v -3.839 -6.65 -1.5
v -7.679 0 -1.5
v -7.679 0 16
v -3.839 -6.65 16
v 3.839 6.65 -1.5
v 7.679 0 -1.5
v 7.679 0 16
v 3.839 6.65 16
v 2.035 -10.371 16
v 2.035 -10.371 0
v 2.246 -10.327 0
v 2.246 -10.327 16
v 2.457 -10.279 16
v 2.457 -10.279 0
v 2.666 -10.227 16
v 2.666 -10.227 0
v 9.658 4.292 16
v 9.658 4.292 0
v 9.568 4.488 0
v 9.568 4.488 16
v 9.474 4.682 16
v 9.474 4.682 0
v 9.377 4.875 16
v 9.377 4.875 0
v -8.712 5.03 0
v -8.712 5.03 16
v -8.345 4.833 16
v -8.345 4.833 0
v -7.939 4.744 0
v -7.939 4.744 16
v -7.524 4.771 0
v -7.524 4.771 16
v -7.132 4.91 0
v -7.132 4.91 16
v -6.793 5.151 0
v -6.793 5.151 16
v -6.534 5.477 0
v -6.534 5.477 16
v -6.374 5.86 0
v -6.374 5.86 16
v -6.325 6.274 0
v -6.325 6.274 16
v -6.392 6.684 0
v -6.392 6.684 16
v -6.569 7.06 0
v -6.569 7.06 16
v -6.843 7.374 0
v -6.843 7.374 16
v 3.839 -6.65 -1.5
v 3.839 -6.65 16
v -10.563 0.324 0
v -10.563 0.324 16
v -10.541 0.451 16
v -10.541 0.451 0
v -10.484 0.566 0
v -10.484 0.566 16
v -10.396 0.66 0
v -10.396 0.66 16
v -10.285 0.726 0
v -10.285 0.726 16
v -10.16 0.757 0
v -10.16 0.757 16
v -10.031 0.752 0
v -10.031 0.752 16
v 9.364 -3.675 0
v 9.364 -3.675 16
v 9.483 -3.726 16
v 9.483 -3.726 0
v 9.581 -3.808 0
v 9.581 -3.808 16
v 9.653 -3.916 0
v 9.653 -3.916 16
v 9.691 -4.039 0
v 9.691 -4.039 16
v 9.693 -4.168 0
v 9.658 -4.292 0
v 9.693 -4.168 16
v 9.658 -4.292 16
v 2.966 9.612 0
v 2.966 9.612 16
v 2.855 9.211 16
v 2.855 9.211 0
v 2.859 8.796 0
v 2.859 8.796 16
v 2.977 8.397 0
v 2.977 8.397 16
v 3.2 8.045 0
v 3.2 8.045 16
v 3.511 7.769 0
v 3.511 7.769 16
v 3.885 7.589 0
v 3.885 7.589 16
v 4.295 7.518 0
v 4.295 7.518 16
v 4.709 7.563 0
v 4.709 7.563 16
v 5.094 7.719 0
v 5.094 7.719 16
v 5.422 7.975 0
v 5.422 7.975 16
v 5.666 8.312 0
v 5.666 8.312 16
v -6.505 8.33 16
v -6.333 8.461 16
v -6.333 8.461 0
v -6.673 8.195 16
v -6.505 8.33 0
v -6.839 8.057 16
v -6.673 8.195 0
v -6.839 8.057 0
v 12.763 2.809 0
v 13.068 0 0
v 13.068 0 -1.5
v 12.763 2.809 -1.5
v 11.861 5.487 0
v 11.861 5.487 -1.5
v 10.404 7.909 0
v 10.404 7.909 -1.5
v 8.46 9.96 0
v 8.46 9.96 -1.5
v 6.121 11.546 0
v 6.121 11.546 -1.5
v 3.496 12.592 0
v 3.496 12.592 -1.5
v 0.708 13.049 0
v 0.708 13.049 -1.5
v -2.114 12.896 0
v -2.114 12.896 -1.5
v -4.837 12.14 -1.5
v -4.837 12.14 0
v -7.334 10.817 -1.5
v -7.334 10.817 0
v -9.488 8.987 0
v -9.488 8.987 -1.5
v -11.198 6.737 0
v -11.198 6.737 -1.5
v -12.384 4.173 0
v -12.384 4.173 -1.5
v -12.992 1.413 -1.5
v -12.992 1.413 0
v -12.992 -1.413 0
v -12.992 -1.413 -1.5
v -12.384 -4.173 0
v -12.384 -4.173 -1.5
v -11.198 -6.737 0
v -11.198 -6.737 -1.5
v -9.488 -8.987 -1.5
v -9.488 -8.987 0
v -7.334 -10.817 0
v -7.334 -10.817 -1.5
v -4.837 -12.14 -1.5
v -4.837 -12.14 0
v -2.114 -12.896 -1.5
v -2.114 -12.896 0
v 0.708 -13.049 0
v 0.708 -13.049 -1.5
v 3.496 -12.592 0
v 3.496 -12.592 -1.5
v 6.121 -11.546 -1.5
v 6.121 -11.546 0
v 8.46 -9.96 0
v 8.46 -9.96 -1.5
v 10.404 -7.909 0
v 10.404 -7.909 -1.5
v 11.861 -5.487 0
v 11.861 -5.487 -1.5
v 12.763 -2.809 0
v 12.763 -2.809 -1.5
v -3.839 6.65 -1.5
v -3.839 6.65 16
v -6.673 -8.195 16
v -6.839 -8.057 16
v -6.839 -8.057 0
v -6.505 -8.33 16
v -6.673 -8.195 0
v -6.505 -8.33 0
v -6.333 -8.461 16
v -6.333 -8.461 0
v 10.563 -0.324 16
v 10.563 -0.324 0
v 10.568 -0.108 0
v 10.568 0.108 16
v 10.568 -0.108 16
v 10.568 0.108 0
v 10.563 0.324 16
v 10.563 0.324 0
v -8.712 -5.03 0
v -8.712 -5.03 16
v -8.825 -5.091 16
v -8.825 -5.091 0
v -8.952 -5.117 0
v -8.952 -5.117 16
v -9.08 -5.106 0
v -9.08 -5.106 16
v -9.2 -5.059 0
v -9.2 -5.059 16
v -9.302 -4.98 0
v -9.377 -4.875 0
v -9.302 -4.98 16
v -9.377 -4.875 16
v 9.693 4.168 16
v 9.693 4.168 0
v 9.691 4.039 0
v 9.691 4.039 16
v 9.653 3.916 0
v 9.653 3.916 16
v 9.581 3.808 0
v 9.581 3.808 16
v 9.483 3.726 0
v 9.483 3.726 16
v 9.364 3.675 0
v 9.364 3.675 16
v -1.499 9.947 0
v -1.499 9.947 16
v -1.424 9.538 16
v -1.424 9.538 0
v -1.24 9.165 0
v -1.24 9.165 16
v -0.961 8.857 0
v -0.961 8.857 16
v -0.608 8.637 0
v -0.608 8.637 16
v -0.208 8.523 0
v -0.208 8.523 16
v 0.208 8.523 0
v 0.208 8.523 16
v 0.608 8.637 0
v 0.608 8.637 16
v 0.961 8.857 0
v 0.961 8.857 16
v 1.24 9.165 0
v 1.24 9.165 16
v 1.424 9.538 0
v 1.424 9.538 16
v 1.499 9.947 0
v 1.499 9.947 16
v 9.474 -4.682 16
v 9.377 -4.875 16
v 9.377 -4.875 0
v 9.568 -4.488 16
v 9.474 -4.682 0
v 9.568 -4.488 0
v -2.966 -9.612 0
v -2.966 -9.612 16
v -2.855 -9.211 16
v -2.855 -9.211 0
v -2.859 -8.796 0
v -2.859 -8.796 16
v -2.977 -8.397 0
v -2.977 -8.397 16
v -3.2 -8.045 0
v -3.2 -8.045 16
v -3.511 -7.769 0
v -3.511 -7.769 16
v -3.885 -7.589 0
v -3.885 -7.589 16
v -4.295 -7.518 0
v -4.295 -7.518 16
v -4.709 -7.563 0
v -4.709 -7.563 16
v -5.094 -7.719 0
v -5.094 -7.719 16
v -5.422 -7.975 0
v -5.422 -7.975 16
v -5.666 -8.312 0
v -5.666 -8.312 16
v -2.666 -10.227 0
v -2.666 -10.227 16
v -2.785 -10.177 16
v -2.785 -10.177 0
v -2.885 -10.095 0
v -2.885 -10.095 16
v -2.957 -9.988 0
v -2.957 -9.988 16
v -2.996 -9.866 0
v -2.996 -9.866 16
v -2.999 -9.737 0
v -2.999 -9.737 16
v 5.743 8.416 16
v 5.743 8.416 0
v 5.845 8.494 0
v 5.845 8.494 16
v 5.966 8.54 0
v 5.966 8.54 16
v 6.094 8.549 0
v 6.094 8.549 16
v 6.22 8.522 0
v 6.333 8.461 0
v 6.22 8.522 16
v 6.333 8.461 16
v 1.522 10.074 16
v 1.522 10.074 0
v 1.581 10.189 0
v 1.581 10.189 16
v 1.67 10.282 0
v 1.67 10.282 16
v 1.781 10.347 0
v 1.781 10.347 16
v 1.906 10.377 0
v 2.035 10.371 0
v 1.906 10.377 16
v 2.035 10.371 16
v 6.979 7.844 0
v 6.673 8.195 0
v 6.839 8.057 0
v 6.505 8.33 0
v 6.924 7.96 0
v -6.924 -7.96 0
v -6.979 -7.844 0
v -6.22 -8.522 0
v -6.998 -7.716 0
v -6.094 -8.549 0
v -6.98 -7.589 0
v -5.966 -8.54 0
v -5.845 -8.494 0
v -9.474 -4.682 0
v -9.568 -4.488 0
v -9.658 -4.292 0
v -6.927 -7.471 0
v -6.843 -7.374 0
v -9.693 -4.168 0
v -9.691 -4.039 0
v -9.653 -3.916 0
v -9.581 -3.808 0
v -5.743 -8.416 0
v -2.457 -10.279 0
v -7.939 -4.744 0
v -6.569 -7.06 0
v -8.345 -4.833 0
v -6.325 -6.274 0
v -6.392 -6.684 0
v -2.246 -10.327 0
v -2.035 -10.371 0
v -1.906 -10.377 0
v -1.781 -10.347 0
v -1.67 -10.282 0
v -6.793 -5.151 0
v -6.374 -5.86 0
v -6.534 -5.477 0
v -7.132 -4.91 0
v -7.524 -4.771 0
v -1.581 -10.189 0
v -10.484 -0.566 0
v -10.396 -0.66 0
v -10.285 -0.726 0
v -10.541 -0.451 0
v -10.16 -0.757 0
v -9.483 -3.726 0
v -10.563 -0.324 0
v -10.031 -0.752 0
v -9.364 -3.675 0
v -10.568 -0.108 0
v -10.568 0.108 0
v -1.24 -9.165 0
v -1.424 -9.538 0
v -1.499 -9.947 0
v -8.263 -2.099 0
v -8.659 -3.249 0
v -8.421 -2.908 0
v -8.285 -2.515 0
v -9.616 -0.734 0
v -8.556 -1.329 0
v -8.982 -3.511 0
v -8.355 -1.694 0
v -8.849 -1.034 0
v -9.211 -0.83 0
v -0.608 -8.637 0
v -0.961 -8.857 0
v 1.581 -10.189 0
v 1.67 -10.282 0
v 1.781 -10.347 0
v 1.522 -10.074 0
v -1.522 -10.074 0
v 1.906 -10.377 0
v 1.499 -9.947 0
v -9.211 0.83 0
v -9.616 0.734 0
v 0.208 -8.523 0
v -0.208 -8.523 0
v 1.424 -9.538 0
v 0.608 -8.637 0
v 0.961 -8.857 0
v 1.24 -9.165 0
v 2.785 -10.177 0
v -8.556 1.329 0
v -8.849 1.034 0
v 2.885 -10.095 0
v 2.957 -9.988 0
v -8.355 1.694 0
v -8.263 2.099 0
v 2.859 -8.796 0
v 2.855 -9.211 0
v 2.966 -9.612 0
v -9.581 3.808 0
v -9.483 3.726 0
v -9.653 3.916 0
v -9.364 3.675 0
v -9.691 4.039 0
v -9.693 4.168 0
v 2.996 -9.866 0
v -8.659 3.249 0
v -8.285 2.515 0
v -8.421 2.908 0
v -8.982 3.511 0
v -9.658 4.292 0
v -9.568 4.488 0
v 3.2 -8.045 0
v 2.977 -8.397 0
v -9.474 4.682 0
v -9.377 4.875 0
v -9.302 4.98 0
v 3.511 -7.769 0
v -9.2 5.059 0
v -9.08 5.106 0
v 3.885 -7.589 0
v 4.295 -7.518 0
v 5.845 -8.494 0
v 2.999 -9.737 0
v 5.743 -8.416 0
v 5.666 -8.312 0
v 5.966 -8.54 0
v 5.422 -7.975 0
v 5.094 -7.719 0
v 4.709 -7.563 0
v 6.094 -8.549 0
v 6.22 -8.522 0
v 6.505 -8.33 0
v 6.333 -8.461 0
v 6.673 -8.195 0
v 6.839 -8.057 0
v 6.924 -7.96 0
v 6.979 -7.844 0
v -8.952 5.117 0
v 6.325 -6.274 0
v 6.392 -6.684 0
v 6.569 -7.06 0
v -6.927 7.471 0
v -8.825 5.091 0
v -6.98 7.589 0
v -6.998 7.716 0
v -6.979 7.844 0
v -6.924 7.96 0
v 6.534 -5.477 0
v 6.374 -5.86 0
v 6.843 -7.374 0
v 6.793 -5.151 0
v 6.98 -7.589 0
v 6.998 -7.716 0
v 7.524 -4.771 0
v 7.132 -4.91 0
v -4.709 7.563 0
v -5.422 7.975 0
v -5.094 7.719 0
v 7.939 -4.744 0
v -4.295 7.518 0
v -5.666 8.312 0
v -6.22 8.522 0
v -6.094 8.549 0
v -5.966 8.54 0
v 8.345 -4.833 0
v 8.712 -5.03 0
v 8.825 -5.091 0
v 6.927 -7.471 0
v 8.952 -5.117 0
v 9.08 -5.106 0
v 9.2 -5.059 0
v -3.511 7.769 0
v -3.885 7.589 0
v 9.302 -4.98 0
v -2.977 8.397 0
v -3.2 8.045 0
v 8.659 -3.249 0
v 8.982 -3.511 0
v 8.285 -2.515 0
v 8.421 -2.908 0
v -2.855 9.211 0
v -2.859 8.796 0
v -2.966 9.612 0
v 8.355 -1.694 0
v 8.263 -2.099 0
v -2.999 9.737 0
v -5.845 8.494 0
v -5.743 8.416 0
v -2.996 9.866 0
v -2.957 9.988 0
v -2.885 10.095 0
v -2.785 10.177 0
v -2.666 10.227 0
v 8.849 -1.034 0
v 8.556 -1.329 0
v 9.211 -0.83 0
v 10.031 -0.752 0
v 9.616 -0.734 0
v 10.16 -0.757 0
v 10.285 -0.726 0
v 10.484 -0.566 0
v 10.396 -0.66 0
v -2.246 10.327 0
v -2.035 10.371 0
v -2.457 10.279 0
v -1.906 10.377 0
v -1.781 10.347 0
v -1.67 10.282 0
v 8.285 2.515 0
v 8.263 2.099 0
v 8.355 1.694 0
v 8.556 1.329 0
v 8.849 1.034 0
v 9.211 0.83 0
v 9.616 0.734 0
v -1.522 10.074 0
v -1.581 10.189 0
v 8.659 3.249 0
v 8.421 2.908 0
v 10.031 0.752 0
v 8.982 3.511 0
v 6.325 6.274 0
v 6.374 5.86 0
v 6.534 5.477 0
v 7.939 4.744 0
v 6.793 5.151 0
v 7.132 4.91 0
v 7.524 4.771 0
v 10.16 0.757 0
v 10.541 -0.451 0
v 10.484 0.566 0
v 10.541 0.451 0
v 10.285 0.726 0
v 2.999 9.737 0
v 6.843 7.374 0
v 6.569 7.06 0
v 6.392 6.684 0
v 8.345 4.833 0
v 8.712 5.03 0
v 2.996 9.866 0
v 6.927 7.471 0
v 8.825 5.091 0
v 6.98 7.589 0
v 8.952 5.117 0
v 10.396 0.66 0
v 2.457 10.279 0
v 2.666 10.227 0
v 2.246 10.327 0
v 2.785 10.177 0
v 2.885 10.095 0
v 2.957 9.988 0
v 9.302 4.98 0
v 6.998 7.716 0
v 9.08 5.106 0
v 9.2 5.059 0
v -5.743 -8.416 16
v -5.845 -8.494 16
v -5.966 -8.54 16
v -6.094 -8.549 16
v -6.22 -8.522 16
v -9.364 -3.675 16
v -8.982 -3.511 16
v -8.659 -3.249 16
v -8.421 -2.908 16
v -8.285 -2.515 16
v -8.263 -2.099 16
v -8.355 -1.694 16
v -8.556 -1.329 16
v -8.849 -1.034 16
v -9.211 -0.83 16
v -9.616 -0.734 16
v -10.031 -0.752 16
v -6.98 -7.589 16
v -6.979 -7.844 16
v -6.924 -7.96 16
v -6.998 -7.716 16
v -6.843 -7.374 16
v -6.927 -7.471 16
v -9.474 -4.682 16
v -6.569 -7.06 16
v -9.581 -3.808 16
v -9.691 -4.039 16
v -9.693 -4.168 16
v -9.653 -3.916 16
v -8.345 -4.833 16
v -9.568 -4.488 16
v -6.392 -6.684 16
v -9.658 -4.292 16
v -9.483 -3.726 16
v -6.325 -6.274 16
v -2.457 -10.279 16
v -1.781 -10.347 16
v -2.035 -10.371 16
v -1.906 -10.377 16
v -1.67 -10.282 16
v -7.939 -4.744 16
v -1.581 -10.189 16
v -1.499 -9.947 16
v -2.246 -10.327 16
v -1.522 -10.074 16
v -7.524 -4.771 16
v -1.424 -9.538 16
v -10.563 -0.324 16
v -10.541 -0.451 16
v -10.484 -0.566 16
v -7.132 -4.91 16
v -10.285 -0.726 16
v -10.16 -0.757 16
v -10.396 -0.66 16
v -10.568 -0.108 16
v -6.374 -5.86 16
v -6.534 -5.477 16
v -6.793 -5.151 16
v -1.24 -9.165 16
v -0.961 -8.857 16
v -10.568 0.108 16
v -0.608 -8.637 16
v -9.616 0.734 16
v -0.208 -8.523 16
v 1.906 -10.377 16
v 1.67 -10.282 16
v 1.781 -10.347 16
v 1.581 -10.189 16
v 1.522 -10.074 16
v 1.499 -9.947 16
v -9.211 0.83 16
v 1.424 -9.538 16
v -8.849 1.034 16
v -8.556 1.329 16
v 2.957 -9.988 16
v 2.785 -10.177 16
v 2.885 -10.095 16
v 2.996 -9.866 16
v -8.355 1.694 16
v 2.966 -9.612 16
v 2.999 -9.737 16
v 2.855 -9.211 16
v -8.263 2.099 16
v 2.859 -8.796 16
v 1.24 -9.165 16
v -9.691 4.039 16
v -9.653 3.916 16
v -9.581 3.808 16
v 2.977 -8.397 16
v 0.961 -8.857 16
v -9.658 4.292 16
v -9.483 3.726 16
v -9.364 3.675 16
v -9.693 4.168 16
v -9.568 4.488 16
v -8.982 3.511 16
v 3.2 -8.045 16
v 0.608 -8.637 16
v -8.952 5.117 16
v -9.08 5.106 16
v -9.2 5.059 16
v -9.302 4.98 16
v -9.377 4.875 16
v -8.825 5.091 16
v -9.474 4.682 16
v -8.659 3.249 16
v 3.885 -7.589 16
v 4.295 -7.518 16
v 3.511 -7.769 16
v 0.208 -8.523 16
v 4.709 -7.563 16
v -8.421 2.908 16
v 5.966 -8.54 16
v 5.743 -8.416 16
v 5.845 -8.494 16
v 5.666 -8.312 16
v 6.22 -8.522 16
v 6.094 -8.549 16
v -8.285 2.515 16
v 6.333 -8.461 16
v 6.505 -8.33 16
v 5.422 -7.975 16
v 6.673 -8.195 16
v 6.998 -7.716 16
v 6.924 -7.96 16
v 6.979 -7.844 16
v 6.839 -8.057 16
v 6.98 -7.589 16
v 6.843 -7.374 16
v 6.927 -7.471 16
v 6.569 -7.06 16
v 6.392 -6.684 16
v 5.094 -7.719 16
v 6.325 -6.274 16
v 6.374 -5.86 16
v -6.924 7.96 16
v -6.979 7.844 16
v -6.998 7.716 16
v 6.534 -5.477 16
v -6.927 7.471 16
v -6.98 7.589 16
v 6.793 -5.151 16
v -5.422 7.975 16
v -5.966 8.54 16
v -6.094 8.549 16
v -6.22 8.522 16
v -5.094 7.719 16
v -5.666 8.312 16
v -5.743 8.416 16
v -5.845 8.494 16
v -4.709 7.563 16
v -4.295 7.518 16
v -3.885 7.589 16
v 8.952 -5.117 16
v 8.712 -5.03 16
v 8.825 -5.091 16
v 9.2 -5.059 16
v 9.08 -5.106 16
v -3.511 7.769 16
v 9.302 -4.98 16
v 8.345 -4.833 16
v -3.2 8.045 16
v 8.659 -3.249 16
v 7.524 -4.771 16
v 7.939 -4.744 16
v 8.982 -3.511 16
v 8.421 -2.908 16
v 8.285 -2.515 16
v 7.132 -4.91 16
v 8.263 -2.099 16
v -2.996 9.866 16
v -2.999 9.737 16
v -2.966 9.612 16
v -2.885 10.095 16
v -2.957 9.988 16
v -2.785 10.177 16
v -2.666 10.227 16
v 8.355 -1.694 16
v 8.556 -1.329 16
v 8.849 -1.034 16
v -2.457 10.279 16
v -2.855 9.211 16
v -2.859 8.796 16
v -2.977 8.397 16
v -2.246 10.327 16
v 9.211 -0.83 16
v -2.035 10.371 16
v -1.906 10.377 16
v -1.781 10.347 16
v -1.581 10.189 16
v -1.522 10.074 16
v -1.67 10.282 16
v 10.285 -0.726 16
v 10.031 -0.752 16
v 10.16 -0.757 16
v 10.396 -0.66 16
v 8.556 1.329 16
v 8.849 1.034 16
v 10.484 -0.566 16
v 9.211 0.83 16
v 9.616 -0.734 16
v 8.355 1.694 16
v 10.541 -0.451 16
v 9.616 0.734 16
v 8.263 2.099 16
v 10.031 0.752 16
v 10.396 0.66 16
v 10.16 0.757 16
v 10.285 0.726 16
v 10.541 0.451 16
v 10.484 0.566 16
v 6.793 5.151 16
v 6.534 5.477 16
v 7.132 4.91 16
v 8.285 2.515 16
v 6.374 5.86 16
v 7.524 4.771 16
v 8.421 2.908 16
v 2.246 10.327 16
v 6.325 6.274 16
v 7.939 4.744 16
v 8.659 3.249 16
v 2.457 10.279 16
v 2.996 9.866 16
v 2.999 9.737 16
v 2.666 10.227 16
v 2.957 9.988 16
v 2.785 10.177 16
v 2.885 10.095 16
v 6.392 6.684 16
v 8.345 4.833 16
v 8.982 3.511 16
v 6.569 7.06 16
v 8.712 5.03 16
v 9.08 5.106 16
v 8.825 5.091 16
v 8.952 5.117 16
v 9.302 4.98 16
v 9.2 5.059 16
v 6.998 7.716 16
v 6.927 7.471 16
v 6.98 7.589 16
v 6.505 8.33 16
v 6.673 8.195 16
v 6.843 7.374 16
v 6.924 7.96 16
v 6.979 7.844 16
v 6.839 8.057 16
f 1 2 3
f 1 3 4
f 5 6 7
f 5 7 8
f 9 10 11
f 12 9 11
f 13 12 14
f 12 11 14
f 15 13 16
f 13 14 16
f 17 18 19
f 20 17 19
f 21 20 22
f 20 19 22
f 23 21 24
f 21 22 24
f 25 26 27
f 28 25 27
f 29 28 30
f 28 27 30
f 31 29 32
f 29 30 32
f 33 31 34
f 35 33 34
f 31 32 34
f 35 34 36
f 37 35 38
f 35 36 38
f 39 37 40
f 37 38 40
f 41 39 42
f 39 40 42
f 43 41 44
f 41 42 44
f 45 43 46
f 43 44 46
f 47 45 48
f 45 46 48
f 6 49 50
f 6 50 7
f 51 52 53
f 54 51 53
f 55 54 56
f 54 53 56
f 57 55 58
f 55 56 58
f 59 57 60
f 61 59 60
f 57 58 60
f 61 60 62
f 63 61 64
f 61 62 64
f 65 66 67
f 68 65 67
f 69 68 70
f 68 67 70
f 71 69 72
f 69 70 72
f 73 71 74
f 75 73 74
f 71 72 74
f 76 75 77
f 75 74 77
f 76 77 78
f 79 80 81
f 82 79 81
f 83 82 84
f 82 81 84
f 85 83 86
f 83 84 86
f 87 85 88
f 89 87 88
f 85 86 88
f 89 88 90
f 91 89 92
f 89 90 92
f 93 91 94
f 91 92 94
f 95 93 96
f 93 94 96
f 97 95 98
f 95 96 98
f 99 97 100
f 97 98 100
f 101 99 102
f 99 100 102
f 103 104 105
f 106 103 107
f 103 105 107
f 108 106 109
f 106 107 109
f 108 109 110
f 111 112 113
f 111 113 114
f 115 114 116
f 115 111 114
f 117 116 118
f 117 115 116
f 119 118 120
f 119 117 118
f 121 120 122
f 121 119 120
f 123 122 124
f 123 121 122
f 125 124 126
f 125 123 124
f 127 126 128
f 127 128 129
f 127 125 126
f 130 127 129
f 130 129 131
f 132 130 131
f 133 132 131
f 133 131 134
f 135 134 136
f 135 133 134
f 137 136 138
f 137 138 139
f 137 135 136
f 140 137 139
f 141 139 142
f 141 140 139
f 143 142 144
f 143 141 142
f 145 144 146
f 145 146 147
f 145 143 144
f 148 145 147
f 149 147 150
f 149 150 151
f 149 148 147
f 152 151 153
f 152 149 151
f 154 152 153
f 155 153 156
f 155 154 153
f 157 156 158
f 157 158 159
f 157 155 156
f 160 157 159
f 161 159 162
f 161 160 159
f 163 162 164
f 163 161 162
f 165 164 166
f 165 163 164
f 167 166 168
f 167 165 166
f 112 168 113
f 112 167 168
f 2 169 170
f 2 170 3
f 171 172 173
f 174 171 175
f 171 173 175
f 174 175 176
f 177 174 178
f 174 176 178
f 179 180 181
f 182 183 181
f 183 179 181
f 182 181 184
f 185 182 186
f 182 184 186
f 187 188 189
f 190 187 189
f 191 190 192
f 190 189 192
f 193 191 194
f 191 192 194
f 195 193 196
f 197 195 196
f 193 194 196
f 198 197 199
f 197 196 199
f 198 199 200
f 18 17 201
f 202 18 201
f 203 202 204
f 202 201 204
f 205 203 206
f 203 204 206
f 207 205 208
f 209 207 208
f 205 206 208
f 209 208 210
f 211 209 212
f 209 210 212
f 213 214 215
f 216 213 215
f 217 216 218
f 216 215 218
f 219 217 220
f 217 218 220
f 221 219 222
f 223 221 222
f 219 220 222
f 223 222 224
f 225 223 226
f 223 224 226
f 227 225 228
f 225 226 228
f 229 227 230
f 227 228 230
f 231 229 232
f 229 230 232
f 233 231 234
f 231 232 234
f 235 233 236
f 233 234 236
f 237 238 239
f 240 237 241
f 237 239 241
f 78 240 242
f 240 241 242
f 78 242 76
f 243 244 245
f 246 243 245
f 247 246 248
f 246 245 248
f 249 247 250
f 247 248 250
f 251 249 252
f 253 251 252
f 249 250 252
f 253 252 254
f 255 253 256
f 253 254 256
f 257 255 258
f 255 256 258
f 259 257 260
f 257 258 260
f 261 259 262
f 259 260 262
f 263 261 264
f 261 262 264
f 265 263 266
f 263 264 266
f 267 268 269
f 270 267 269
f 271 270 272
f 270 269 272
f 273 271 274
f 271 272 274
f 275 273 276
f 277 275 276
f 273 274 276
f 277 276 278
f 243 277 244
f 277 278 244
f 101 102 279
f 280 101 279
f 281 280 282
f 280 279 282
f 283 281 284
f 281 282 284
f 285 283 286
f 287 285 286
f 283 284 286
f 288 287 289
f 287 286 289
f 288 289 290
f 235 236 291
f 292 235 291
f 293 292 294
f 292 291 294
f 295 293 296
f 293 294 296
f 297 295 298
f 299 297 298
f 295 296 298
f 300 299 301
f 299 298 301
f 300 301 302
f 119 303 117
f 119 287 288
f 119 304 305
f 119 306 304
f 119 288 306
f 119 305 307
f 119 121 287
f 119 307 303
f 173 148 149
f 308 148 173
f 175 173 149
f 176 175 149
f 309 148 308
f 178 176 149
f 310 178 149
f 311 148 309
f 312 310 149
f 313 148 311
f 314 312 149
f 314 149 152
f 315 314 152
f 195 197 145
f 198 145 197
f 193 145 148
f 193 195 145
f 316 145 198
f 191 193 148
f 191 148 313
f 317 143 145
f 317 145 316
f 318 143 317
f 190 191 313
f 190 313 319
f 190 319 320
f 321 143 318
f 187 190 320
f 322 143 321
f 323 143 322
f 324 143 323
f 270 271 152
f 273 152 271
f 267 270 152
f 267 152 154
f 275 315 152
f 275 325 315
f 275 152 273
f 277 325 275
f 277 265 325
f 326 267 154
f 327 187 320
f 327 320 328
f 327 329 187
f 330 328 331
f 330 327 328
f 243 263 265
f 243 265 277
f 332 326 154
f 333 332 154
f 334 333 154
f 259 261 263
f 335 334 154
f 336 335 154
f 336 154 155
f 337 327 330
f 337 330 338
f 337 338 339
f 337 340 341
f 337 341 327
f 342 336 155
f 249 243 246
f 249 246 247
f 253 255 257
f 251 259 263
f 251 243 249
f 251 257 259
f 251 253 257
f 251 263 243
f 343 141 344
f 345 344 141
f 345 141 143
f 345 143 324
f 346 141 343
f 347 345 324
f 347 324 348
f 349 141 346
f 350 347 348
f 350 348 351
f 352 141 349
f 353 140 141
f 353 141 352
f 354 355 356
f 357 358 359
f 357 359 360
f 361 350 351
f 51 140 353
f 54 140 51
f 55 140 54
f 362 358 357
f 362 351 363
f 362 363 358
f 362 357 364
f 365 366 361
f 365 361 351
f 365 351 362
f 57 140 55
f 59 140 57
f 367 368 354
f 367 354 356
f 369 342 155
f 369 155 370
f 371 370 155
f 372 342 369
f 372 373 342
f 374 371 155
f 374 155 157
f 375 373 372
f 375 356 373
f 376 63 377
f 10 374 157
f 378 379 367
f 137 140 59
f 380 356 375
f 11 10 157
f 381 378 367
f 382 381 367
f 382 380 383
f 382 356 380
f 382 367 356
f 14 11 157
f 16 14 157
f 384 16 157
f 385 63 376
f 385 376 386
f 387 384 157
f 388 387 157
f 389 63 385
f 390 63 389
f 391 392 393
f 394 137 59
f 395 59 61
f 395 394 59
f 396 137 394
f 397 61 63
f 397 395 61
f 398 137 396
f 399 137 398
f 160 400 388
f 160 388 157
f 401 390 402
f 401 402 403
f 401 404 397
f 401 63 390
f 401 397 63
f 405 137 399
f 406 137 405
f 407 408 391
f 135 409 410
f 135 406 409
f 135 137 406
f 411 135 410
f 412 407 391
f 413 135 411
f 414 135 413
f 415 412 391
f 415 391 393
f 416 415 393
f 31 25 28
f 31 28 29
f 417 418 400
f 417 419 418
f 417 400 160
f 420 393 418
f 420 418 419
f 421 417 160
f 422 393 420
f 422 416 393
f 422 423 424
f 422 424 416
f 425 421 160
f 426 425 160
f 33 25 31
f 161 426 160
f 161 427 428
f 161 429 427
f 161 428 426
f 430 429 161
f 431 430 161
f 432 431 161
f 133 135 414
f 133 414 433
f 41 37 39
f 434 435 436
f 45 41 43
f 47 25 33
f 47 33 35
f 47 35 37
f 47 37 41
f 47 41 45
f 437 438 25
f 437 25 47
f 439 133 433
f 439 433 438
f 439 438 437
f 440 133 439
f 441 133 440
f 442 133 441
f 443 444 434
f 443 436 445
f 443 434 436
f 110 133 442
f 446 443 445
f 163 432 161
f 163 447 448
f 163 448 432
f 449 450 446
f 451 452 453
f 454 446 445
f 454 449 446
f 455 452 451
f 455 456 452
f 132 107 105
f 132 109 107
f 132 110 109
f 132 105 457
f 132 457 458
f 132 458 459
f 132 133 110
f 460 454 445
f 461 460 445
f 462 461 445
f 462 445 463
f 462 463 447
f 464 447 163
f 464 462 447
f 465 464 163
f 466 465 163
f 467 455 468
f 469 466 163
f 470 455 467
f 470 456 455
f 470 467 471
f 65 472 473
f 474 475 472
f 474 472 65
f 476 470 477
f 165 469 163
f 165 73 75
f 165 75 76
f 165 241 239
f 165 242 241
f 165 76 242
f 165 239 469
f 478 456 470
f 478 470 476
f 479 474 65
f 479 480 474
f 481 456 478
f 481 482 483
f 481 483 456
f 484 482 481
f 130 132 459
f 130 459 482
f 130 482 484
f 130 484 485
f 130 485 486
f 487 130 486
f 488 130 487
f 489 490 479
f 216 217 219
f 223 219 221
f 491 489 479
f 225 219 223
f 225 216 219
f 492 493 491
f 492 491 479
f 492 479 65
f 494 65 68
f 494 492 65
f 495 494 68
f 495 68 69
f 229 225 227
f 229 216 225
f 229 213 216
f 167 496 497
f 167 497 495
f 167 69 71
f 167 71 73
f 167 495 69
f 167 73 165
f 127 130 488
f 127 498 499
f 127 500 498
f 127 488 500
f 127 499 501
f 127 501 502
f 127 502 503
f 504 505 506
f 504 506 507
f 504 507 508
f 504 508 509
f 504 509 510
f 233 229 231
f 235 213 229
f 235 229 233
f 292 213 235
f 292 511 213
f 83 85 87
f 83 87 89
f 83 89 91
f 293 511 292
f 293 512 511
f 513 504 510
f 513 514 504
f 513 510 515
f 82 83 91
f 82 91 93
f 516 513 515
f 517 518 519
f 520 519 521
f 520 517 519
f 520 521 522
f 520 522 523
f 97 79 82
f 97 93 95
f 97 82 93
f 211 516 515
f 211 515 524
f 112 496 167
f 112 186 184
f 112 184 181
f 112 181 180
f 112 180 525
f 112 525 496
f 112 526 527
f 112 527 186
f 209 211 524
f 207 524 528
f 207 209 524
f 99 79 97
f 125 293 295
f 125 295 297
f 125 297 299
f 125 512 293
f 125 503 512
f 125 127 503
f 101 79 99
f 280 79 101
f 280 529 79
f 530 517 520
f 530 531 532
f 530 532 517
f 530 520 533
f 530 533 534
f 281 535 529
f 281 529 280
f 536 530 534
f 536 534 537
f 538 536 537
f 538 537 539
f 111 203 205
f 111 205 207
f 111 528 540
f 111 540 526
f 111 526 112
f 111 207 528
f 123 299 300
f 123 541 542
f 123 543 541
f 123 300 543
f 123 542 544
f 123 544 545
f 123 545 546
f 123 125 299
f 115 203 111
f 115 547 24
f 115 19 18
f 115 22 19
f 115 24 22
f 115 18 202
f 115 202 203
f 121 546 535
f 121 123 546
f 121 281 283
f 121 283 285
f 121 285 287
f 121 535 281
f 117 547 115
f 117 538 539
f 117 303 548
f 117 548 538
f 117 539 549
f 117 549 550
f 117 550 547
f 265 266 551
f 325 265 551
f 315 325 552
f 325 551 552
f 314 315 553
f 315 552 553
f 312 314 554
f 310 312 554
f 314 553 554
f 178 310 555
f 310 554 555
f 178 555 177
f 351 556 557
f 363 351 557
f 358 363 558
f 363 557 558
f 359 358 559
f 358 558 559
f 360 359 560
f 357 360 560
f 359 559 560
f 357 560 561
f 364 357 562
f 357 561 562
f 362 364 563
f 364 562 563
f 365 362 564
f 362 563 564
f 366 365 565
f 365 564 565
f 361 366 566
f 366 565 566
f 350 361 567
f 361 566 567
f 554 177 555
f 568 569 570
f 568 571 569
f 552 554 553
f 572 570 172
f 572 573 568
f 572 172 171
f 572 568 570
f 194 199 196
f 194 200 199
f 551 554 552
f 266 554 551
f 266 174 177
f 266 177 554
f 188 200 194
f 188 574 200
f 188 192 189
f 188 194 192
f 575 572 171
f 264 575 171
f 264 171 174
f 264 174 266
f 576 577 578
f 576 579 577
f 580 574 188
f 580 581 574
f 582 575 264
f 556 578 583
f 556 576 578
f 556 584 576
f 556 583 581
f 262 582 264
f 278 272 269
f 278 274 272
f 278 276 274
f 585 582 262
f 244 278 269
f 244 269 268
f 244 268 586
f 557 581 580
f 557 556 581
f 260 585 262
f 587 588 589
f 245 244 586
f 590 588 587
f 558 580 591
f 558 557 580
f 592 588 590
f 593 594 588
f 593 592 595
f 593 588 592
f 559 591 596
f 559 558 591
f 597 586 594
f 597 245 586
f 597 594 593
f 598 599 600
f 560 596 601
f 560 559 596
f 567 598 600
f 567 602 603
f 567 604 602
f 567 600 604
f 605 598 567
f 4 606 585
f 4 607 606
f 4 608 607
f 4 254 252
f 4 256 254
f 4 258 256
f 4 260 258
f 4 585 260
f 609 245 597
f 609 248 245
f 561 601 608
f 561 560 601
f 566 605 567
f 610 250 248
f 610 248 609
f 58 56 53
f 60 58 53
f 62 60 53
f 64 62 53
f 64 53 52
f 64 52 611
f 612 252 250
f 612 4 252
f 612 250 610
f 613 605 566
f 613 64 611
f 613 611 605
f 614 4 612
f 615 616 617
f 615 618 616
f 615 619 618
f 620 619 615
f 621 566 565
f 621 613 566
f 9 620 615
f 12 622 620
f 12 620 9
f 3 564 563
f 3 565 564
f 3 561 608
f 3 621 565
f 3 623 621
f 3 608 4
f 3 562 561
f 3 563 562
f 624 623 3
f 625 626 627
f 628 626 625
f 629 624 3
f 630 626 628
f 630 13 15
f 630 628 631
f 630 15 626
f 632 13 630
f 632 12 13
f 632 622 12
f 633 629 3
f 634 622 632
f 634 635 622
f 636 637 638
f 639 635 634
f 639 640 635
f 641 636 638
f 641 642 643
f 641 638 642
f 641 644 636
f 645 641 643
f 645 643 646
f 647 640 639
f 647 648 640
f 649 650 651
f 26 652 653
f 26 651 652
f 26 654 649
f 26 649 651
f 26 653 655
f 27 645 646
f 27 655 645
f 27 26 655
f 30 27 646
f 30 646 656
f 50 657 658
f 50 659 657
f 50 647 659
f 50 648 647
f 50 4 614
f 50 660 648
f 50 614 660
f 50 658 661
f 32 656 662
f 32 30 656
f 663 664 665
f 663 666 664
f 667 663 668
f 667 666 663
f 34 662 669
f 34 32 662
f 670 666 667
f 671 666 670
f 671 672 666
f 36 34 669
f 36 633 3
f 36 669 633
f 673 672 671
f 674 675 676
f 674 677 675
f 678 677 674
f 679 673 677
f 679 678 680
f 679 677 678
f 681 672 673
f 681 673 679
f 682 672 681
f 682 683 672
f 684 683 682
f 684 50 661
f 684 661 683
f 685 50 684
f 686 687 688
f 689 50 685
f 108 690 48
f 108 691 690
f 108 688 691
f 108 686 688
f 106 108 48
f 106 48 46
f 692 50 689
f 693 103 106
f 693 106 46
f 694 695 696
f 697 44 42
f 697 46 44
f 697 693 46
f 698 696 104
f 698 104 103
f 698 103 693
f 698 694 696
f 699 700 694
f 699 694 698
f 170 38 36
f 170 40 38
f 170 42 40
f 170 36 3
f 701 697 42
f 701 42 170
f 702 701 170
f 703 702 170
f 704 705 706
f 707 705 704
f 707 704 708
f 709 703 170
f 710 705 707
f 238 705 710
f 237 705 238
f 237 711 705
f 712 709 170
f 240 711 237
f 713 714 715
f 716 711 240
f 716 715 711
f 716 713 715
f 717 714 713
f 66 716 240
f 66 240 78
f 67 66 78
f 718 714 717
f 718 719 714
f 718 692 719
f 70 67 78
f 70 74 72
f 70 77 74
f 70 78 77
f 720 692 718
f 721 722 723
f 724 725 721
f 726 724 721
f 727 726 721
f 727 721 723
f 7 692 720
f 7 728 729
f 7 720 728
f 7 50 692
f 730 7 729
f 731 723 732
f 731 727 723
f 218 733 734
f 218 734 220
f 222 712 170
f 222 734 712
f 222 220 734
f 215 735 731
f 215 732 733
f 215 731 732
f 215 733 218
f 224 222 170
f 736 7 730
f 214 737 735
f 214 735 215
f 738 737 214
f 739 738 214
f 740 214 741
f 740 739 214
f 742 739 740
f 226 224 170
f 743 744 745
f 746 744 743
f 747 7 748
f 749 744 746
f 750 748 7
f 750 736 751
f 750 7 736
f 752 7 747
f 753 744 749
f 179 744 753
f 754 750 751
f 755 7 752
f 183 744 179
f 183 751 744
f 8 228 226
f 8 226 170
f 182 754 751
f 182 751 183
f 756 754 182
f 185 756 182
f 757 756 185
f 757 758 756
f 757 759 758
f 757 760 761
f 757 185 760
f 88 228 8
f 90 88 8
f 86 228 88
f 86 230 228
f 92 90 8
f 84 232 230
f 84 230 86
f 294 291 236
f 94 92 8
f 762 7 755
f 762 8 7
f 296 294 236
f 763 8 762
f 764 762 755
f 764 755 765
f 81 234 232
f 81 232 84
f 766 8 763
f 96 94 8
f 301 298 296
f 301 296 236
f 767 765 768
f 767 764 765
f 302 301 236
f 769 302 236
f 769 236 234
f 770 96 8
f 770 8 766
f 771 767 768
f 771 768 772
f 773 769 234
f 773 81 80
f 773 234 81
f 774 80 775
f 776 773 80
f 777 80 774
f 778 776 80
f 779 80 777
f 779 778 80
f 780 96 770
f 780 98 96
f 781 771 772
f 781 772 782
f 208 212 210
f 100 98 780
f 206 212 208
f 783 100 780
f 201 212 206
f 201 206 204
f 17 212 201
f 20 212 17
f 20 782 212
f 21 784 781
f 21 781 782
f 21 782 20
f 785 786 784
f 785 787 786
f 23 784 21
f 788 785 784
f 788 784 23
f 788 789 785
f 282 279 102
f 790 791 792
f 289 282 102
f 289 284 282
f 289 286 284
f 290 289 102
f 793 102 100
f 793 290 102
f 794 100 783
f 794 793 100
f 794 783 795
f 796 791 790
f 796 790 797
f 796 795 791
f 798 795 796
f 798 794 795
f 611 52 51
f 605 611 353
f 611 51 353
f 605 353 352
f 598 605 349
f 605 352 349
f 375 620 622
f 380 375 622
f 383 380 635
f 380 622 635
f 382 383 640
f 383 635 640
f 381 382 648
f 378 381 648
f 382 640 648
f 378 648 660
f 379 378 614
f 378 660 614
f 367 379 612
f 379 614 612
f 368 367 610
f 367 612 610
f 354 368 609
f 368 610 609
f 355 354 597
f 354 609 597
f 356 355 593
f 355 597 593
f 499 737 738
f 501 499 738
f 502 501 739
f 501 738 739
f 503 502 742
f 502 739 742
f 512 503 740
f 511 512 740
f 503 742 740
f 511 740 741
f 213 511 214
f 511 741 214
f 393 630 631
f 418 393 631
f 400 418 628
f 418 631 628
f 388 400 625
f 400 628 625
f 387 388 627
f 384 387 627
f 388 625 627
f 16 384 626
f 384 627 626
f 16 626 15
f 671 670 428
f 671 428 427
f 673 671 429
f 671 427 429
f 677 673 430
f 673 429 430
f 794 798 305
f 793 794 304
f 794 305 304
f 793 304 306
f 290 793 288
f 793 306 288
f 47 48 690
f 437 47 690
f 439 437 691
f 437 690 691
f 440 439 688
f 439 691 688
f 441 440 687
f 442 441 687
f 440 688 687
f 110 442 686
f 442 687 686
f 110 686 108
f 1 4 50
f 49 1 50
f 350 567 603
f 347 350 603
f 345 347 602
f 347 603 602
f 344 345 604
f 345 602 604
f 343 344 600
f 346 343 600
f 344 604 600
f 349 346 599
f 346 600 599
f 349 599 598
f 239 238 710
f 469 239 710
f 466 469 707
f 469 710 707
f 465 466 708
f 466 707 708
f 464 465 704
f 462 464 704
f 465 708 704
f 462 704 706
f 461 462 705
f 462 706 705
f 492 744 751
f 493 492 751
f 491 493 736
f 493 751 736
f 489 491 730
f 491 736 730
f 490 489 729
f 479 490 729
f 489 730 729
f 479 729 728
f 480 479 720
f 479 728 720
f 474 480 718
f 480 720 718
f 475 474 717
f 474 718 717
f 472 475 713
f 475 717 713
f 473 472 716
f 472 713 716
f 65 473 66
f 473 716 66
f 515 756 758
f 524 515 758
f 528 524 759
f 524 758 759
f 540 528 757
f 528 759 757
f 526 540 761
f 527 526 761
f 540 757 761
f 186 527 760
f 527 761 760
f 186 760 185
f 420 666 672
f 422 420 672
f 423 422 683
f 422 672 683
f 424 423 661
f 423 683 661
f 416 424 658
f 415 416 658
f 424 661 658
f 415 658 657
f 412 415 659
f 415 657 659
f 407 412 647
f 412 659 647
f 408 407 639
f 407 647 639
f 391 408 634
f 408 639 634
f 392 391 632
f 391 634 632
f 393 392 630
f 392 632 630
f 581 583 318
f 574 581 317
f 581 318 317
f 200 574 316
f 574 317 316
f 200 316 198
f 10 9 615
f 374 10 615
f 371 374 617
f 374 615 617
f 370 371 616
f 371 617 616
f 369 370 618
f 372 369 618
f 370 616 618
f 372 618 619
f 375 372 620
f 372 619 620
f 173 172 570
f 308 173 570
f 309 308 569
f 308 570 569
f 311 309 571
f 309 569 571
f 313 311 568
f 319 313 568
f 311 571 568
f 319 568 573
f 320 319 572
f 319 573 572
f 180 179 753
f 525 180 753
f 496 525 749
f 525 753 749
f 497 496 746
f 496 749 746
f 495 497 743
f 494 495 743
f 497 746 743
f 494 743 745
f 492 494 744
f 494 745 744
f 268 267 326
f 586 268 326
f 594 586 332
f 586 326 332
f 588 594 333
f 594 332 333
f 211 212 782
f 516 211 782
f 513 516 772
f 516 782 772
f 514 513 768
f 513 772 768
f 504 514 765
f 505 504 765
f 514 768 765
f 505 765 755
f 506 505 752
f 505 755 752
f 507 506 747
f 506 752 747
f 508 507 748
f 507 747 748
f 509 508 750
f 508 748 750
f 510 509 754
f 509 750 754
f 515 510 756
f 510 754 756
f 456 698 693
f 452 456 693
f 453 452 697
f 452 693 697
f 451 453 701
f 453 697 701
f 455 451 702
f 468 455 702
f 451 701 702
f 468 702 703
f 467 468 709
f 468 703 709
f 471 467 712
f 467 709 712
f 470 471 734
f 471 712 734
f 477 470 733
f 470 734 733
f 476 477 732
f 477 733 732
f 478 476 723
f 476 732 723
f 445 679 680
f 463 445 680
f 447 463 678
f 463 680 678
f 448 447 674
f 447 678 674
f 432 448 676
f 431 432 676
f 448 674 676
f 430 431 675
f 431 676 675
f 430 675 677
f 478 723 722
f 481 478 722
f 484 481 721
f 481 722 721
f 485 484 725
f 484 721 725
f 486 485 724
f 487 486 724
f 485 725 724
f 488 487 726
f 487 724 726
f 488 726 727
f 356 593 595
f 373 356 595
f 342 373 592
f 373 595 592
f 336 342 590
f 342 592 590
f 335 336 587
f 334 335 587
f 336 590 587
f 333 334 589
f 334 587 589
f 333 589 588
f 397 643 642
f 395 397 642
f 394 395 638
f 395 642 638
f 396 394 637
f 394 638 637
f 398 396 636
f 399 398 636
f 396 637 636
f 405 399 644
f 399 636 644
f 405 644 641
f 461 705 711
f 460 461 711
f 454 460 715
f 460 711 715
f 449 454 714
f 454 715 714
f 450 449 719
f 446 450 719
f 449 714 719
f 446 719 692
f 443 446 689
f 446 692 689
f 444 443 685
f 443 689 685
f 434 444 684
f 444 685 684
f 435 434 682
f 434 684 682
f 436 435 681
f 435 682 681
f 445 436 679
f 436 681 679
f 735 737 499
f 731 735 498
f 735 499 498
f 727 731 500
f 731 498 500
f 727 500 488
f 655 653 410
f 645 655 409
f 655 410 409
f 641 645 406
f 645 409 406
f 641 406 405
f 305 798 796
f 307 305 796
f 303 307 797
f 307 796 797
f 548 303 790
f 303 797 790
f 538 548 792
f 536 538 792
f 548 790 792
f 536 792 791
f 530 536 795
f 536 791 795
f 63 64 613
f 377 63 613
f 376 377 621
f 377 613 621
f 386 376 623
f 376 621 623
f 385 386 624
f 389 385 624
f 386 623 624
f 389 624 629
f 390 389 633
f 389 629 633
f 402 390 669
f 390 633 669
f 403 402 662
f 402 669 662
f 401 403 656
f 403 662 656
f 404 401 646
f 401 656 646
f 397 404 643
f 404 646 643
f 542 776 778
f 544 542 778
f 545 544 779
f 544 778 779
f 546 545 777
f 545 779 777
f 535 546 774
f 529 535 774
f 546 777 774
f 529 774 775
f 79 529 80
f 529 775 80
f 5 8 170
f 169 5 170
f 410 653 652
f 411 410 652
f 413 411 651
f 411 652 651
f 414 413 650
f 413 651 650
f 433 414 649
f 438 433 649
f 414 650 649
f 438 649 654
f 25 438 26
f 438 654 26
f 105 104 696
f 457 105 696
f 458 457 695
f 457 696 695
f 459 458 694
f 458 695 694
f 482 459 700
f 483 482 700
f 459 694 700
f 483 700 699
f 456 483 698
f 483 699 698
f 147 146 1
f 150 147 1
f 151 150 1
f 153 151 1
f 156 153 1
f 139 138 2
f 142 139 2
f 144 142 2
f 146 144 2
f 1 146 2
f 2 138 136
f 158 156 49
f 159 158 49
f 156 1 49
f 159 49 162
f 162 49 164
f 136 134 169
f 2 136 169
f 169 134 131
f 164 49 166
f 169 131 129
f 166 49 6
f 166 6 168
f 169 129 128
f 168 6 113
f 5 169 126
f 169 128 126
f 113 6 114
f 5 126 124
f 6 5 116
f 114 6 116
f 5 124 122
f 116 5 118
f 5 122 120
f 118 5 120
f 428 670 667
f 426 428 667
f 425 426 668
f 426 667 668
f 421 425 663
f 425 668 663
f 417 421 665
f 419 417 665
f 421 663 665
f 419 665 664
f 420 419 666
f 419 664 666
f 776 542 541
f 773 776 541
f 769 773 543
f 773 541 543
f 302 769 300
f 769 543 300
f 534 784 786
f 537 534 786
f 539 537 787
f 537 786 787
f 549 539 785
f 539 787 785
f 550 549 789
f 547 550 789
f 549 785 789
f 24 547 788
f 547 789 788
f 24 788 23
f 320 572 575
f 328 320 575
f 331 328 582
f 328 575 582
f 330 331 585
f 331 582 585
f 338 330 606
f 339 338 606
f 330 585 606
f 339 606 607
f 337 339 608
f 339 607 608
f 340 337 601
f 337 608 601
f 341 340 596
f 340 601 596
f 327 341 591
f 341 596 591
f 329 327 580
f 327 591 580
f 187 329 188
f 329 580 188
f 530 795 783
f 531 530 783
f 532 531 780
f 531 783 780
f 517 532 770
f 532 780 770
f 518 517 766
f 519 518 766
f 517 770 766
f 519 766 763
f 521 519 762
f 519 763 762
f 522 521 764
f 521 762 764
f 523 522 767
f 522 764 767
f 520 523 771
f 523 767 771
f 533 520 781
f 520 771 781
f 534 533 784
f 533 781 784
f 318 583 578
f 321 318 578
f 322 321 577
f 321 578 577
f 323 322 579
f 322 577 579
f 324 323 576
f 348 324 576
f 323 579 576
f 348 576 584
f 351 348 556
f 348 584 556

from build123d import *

# Parameters (mm, degrees)
F2_R            = 10.5683460292
F3_DEPTH        = 16
F5_DEPTH        = 16
F5_COPIES_COUNT = 14
F8_R            = 13.0683460292
F8_R_2          = 10.5683460292
F9_DEPTH        = 1.5
F10_DEPTH       = 17.501


# Not quite as in the source:
# - a feature of the source that left no trace in its solid (it failed there, or was rolled back) is left out
# - a pattern or mirror of a feature is missing from the dataset's text; its kind, count and spacing are read off the source's solid


with BuildPart() as f3:
    # F2 (on Top) → F3 (new body)
    with BuildSketch(Plane.XY):
        Circle(F2_R)
    extrude(amount=F3_DEPTH)

    # F4 (on face) → F5 (cut, through all)
    with BuildSketch(Plane.XY.offset(16)):
        with BuildLine():
            ThreePointArc((-2.035036184, 10.3705624496), (-1.6695907294, 10.2822178496), (-1.4987572129, 9.9472983692))
            ThreePointArc((-1.4987572129, 9.9472983692), (0, 8.5083460292), (1.4987572129, 9.9472983692))
            ThreePointArc((1.4987572129, 9.9472983692), (1.6695907294, 10.2822178496), (2.035036184, 10.3705624496))
            ThreePointArc((2.035036184, 10.3705624496), (0, 10.5683460292), (-2.035036184, 10.3705624496))
        make_face()
    f5 = extrude(amount=-F5_DEPTH, mode=Mode.SUBTRACT)

    # F5_copies: F5 ×14 about axis
    f5_copies_axis = Axis((0, 0, 0), (0, 0, 1))
    for i in range(1, F5_COPIES_COUNT):
        add(f5.rotate(f5_copies_axis, i * 360 / F5_COPIES_COUNT), mode=Mode.SUBTRACT)

    # F8 (on face) + F2 (on Top) → F9 (join)
    with BuildSketch(Plane.XY):
        Circle(F8_R)
        Circle(F8_R_2, mode=Mode.SUBTRACT)
    with BuildSketch(Plane.XY):
        Circle(F2_R)
    extrude(amount=-F9_DEPTH)

    # F7 (on face) → F10 (cut, through all)
    with BuildSketch(Plane.XY.offset(16)):
        Polygon((3.8393792901, 6.65), (-3.8393792901, 6.65), (-7.6787585802, 0), (-3.8393792901, -6.65), (3.8393792901, -6.65), (7.6787585802, 0), align=None)
    extrude(amount=-F10_DEPTH, mode=Mode.SUBTRACT)


solid = f3.part
